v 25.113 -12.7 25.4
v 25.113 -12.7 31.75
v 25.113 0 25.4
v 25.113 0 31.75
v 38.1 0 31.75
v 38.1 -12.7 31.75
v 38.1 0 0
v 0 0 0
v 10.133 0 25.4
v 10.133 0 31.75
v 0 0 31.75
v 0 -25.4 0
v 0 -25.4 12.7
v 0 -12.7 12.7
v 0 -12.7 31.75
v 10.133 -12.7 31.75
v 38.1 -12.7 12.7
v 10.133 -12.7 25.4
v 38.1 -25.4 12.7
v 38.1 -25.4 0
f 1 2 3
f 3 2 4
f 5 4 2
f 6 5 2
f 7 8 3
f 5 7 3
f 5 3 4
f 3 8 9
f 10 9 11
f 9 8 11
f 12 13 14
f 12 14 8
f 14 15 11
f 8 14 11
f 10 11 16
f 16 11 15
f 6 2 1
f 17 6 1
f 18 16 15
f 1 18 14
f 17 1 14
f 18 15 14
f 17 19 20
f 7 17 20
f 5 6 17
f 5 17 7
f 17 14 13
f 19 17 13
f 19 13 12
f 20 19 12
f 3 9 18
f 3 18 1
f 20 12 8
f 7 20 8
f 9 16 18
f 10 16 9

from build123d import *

# Parameters (mm, degrees)
F1_DEPTH = 25.4
F2_DEPTH = 12.7
F3_W     = 14.980048
F3_H     = 12.7
F4_DEPTH = 6.35


with BuildPart() as f1:
    # F0 (on Right) → F1 (new body)
    with BuildSketch(Plane.YZ):
        Polygon((-25.4, 0), (0, 0), (0, 31.75), (-12.7, 31.75), (-12.7, 12.7), (-25.4, 12.7), align=None)
    extrude(amount=F1_DEPTH)

    # F1_face (on face) → F2 (join)
    with BuildSketch(Plane(origin=(25.4, -9.978571, 13.153571), x_dir=(0, 1, 0), z_dir=(1, 0, 0))):
        Polygon((-15.421429, -13.153571), (9.978571, -13.153571), (9.978571, 18.596429), (-2.721429, 18.596429), (-2.721429, -0.453571), (-15.421429, -0.453571), align=None)
    extrude(amount=F2_DEPTH)

    # F3 (on face) → F4 (cut)
    with BuildSketch(Plane.XY.offset(31.75)):
        with Locations((17.623421, -6.35)):
            Rectangle(F3_W, F3_H)
    extrude(amount=-F4_DEPTH, mode=Mode.SUBTRACT)


solid = f1.part
